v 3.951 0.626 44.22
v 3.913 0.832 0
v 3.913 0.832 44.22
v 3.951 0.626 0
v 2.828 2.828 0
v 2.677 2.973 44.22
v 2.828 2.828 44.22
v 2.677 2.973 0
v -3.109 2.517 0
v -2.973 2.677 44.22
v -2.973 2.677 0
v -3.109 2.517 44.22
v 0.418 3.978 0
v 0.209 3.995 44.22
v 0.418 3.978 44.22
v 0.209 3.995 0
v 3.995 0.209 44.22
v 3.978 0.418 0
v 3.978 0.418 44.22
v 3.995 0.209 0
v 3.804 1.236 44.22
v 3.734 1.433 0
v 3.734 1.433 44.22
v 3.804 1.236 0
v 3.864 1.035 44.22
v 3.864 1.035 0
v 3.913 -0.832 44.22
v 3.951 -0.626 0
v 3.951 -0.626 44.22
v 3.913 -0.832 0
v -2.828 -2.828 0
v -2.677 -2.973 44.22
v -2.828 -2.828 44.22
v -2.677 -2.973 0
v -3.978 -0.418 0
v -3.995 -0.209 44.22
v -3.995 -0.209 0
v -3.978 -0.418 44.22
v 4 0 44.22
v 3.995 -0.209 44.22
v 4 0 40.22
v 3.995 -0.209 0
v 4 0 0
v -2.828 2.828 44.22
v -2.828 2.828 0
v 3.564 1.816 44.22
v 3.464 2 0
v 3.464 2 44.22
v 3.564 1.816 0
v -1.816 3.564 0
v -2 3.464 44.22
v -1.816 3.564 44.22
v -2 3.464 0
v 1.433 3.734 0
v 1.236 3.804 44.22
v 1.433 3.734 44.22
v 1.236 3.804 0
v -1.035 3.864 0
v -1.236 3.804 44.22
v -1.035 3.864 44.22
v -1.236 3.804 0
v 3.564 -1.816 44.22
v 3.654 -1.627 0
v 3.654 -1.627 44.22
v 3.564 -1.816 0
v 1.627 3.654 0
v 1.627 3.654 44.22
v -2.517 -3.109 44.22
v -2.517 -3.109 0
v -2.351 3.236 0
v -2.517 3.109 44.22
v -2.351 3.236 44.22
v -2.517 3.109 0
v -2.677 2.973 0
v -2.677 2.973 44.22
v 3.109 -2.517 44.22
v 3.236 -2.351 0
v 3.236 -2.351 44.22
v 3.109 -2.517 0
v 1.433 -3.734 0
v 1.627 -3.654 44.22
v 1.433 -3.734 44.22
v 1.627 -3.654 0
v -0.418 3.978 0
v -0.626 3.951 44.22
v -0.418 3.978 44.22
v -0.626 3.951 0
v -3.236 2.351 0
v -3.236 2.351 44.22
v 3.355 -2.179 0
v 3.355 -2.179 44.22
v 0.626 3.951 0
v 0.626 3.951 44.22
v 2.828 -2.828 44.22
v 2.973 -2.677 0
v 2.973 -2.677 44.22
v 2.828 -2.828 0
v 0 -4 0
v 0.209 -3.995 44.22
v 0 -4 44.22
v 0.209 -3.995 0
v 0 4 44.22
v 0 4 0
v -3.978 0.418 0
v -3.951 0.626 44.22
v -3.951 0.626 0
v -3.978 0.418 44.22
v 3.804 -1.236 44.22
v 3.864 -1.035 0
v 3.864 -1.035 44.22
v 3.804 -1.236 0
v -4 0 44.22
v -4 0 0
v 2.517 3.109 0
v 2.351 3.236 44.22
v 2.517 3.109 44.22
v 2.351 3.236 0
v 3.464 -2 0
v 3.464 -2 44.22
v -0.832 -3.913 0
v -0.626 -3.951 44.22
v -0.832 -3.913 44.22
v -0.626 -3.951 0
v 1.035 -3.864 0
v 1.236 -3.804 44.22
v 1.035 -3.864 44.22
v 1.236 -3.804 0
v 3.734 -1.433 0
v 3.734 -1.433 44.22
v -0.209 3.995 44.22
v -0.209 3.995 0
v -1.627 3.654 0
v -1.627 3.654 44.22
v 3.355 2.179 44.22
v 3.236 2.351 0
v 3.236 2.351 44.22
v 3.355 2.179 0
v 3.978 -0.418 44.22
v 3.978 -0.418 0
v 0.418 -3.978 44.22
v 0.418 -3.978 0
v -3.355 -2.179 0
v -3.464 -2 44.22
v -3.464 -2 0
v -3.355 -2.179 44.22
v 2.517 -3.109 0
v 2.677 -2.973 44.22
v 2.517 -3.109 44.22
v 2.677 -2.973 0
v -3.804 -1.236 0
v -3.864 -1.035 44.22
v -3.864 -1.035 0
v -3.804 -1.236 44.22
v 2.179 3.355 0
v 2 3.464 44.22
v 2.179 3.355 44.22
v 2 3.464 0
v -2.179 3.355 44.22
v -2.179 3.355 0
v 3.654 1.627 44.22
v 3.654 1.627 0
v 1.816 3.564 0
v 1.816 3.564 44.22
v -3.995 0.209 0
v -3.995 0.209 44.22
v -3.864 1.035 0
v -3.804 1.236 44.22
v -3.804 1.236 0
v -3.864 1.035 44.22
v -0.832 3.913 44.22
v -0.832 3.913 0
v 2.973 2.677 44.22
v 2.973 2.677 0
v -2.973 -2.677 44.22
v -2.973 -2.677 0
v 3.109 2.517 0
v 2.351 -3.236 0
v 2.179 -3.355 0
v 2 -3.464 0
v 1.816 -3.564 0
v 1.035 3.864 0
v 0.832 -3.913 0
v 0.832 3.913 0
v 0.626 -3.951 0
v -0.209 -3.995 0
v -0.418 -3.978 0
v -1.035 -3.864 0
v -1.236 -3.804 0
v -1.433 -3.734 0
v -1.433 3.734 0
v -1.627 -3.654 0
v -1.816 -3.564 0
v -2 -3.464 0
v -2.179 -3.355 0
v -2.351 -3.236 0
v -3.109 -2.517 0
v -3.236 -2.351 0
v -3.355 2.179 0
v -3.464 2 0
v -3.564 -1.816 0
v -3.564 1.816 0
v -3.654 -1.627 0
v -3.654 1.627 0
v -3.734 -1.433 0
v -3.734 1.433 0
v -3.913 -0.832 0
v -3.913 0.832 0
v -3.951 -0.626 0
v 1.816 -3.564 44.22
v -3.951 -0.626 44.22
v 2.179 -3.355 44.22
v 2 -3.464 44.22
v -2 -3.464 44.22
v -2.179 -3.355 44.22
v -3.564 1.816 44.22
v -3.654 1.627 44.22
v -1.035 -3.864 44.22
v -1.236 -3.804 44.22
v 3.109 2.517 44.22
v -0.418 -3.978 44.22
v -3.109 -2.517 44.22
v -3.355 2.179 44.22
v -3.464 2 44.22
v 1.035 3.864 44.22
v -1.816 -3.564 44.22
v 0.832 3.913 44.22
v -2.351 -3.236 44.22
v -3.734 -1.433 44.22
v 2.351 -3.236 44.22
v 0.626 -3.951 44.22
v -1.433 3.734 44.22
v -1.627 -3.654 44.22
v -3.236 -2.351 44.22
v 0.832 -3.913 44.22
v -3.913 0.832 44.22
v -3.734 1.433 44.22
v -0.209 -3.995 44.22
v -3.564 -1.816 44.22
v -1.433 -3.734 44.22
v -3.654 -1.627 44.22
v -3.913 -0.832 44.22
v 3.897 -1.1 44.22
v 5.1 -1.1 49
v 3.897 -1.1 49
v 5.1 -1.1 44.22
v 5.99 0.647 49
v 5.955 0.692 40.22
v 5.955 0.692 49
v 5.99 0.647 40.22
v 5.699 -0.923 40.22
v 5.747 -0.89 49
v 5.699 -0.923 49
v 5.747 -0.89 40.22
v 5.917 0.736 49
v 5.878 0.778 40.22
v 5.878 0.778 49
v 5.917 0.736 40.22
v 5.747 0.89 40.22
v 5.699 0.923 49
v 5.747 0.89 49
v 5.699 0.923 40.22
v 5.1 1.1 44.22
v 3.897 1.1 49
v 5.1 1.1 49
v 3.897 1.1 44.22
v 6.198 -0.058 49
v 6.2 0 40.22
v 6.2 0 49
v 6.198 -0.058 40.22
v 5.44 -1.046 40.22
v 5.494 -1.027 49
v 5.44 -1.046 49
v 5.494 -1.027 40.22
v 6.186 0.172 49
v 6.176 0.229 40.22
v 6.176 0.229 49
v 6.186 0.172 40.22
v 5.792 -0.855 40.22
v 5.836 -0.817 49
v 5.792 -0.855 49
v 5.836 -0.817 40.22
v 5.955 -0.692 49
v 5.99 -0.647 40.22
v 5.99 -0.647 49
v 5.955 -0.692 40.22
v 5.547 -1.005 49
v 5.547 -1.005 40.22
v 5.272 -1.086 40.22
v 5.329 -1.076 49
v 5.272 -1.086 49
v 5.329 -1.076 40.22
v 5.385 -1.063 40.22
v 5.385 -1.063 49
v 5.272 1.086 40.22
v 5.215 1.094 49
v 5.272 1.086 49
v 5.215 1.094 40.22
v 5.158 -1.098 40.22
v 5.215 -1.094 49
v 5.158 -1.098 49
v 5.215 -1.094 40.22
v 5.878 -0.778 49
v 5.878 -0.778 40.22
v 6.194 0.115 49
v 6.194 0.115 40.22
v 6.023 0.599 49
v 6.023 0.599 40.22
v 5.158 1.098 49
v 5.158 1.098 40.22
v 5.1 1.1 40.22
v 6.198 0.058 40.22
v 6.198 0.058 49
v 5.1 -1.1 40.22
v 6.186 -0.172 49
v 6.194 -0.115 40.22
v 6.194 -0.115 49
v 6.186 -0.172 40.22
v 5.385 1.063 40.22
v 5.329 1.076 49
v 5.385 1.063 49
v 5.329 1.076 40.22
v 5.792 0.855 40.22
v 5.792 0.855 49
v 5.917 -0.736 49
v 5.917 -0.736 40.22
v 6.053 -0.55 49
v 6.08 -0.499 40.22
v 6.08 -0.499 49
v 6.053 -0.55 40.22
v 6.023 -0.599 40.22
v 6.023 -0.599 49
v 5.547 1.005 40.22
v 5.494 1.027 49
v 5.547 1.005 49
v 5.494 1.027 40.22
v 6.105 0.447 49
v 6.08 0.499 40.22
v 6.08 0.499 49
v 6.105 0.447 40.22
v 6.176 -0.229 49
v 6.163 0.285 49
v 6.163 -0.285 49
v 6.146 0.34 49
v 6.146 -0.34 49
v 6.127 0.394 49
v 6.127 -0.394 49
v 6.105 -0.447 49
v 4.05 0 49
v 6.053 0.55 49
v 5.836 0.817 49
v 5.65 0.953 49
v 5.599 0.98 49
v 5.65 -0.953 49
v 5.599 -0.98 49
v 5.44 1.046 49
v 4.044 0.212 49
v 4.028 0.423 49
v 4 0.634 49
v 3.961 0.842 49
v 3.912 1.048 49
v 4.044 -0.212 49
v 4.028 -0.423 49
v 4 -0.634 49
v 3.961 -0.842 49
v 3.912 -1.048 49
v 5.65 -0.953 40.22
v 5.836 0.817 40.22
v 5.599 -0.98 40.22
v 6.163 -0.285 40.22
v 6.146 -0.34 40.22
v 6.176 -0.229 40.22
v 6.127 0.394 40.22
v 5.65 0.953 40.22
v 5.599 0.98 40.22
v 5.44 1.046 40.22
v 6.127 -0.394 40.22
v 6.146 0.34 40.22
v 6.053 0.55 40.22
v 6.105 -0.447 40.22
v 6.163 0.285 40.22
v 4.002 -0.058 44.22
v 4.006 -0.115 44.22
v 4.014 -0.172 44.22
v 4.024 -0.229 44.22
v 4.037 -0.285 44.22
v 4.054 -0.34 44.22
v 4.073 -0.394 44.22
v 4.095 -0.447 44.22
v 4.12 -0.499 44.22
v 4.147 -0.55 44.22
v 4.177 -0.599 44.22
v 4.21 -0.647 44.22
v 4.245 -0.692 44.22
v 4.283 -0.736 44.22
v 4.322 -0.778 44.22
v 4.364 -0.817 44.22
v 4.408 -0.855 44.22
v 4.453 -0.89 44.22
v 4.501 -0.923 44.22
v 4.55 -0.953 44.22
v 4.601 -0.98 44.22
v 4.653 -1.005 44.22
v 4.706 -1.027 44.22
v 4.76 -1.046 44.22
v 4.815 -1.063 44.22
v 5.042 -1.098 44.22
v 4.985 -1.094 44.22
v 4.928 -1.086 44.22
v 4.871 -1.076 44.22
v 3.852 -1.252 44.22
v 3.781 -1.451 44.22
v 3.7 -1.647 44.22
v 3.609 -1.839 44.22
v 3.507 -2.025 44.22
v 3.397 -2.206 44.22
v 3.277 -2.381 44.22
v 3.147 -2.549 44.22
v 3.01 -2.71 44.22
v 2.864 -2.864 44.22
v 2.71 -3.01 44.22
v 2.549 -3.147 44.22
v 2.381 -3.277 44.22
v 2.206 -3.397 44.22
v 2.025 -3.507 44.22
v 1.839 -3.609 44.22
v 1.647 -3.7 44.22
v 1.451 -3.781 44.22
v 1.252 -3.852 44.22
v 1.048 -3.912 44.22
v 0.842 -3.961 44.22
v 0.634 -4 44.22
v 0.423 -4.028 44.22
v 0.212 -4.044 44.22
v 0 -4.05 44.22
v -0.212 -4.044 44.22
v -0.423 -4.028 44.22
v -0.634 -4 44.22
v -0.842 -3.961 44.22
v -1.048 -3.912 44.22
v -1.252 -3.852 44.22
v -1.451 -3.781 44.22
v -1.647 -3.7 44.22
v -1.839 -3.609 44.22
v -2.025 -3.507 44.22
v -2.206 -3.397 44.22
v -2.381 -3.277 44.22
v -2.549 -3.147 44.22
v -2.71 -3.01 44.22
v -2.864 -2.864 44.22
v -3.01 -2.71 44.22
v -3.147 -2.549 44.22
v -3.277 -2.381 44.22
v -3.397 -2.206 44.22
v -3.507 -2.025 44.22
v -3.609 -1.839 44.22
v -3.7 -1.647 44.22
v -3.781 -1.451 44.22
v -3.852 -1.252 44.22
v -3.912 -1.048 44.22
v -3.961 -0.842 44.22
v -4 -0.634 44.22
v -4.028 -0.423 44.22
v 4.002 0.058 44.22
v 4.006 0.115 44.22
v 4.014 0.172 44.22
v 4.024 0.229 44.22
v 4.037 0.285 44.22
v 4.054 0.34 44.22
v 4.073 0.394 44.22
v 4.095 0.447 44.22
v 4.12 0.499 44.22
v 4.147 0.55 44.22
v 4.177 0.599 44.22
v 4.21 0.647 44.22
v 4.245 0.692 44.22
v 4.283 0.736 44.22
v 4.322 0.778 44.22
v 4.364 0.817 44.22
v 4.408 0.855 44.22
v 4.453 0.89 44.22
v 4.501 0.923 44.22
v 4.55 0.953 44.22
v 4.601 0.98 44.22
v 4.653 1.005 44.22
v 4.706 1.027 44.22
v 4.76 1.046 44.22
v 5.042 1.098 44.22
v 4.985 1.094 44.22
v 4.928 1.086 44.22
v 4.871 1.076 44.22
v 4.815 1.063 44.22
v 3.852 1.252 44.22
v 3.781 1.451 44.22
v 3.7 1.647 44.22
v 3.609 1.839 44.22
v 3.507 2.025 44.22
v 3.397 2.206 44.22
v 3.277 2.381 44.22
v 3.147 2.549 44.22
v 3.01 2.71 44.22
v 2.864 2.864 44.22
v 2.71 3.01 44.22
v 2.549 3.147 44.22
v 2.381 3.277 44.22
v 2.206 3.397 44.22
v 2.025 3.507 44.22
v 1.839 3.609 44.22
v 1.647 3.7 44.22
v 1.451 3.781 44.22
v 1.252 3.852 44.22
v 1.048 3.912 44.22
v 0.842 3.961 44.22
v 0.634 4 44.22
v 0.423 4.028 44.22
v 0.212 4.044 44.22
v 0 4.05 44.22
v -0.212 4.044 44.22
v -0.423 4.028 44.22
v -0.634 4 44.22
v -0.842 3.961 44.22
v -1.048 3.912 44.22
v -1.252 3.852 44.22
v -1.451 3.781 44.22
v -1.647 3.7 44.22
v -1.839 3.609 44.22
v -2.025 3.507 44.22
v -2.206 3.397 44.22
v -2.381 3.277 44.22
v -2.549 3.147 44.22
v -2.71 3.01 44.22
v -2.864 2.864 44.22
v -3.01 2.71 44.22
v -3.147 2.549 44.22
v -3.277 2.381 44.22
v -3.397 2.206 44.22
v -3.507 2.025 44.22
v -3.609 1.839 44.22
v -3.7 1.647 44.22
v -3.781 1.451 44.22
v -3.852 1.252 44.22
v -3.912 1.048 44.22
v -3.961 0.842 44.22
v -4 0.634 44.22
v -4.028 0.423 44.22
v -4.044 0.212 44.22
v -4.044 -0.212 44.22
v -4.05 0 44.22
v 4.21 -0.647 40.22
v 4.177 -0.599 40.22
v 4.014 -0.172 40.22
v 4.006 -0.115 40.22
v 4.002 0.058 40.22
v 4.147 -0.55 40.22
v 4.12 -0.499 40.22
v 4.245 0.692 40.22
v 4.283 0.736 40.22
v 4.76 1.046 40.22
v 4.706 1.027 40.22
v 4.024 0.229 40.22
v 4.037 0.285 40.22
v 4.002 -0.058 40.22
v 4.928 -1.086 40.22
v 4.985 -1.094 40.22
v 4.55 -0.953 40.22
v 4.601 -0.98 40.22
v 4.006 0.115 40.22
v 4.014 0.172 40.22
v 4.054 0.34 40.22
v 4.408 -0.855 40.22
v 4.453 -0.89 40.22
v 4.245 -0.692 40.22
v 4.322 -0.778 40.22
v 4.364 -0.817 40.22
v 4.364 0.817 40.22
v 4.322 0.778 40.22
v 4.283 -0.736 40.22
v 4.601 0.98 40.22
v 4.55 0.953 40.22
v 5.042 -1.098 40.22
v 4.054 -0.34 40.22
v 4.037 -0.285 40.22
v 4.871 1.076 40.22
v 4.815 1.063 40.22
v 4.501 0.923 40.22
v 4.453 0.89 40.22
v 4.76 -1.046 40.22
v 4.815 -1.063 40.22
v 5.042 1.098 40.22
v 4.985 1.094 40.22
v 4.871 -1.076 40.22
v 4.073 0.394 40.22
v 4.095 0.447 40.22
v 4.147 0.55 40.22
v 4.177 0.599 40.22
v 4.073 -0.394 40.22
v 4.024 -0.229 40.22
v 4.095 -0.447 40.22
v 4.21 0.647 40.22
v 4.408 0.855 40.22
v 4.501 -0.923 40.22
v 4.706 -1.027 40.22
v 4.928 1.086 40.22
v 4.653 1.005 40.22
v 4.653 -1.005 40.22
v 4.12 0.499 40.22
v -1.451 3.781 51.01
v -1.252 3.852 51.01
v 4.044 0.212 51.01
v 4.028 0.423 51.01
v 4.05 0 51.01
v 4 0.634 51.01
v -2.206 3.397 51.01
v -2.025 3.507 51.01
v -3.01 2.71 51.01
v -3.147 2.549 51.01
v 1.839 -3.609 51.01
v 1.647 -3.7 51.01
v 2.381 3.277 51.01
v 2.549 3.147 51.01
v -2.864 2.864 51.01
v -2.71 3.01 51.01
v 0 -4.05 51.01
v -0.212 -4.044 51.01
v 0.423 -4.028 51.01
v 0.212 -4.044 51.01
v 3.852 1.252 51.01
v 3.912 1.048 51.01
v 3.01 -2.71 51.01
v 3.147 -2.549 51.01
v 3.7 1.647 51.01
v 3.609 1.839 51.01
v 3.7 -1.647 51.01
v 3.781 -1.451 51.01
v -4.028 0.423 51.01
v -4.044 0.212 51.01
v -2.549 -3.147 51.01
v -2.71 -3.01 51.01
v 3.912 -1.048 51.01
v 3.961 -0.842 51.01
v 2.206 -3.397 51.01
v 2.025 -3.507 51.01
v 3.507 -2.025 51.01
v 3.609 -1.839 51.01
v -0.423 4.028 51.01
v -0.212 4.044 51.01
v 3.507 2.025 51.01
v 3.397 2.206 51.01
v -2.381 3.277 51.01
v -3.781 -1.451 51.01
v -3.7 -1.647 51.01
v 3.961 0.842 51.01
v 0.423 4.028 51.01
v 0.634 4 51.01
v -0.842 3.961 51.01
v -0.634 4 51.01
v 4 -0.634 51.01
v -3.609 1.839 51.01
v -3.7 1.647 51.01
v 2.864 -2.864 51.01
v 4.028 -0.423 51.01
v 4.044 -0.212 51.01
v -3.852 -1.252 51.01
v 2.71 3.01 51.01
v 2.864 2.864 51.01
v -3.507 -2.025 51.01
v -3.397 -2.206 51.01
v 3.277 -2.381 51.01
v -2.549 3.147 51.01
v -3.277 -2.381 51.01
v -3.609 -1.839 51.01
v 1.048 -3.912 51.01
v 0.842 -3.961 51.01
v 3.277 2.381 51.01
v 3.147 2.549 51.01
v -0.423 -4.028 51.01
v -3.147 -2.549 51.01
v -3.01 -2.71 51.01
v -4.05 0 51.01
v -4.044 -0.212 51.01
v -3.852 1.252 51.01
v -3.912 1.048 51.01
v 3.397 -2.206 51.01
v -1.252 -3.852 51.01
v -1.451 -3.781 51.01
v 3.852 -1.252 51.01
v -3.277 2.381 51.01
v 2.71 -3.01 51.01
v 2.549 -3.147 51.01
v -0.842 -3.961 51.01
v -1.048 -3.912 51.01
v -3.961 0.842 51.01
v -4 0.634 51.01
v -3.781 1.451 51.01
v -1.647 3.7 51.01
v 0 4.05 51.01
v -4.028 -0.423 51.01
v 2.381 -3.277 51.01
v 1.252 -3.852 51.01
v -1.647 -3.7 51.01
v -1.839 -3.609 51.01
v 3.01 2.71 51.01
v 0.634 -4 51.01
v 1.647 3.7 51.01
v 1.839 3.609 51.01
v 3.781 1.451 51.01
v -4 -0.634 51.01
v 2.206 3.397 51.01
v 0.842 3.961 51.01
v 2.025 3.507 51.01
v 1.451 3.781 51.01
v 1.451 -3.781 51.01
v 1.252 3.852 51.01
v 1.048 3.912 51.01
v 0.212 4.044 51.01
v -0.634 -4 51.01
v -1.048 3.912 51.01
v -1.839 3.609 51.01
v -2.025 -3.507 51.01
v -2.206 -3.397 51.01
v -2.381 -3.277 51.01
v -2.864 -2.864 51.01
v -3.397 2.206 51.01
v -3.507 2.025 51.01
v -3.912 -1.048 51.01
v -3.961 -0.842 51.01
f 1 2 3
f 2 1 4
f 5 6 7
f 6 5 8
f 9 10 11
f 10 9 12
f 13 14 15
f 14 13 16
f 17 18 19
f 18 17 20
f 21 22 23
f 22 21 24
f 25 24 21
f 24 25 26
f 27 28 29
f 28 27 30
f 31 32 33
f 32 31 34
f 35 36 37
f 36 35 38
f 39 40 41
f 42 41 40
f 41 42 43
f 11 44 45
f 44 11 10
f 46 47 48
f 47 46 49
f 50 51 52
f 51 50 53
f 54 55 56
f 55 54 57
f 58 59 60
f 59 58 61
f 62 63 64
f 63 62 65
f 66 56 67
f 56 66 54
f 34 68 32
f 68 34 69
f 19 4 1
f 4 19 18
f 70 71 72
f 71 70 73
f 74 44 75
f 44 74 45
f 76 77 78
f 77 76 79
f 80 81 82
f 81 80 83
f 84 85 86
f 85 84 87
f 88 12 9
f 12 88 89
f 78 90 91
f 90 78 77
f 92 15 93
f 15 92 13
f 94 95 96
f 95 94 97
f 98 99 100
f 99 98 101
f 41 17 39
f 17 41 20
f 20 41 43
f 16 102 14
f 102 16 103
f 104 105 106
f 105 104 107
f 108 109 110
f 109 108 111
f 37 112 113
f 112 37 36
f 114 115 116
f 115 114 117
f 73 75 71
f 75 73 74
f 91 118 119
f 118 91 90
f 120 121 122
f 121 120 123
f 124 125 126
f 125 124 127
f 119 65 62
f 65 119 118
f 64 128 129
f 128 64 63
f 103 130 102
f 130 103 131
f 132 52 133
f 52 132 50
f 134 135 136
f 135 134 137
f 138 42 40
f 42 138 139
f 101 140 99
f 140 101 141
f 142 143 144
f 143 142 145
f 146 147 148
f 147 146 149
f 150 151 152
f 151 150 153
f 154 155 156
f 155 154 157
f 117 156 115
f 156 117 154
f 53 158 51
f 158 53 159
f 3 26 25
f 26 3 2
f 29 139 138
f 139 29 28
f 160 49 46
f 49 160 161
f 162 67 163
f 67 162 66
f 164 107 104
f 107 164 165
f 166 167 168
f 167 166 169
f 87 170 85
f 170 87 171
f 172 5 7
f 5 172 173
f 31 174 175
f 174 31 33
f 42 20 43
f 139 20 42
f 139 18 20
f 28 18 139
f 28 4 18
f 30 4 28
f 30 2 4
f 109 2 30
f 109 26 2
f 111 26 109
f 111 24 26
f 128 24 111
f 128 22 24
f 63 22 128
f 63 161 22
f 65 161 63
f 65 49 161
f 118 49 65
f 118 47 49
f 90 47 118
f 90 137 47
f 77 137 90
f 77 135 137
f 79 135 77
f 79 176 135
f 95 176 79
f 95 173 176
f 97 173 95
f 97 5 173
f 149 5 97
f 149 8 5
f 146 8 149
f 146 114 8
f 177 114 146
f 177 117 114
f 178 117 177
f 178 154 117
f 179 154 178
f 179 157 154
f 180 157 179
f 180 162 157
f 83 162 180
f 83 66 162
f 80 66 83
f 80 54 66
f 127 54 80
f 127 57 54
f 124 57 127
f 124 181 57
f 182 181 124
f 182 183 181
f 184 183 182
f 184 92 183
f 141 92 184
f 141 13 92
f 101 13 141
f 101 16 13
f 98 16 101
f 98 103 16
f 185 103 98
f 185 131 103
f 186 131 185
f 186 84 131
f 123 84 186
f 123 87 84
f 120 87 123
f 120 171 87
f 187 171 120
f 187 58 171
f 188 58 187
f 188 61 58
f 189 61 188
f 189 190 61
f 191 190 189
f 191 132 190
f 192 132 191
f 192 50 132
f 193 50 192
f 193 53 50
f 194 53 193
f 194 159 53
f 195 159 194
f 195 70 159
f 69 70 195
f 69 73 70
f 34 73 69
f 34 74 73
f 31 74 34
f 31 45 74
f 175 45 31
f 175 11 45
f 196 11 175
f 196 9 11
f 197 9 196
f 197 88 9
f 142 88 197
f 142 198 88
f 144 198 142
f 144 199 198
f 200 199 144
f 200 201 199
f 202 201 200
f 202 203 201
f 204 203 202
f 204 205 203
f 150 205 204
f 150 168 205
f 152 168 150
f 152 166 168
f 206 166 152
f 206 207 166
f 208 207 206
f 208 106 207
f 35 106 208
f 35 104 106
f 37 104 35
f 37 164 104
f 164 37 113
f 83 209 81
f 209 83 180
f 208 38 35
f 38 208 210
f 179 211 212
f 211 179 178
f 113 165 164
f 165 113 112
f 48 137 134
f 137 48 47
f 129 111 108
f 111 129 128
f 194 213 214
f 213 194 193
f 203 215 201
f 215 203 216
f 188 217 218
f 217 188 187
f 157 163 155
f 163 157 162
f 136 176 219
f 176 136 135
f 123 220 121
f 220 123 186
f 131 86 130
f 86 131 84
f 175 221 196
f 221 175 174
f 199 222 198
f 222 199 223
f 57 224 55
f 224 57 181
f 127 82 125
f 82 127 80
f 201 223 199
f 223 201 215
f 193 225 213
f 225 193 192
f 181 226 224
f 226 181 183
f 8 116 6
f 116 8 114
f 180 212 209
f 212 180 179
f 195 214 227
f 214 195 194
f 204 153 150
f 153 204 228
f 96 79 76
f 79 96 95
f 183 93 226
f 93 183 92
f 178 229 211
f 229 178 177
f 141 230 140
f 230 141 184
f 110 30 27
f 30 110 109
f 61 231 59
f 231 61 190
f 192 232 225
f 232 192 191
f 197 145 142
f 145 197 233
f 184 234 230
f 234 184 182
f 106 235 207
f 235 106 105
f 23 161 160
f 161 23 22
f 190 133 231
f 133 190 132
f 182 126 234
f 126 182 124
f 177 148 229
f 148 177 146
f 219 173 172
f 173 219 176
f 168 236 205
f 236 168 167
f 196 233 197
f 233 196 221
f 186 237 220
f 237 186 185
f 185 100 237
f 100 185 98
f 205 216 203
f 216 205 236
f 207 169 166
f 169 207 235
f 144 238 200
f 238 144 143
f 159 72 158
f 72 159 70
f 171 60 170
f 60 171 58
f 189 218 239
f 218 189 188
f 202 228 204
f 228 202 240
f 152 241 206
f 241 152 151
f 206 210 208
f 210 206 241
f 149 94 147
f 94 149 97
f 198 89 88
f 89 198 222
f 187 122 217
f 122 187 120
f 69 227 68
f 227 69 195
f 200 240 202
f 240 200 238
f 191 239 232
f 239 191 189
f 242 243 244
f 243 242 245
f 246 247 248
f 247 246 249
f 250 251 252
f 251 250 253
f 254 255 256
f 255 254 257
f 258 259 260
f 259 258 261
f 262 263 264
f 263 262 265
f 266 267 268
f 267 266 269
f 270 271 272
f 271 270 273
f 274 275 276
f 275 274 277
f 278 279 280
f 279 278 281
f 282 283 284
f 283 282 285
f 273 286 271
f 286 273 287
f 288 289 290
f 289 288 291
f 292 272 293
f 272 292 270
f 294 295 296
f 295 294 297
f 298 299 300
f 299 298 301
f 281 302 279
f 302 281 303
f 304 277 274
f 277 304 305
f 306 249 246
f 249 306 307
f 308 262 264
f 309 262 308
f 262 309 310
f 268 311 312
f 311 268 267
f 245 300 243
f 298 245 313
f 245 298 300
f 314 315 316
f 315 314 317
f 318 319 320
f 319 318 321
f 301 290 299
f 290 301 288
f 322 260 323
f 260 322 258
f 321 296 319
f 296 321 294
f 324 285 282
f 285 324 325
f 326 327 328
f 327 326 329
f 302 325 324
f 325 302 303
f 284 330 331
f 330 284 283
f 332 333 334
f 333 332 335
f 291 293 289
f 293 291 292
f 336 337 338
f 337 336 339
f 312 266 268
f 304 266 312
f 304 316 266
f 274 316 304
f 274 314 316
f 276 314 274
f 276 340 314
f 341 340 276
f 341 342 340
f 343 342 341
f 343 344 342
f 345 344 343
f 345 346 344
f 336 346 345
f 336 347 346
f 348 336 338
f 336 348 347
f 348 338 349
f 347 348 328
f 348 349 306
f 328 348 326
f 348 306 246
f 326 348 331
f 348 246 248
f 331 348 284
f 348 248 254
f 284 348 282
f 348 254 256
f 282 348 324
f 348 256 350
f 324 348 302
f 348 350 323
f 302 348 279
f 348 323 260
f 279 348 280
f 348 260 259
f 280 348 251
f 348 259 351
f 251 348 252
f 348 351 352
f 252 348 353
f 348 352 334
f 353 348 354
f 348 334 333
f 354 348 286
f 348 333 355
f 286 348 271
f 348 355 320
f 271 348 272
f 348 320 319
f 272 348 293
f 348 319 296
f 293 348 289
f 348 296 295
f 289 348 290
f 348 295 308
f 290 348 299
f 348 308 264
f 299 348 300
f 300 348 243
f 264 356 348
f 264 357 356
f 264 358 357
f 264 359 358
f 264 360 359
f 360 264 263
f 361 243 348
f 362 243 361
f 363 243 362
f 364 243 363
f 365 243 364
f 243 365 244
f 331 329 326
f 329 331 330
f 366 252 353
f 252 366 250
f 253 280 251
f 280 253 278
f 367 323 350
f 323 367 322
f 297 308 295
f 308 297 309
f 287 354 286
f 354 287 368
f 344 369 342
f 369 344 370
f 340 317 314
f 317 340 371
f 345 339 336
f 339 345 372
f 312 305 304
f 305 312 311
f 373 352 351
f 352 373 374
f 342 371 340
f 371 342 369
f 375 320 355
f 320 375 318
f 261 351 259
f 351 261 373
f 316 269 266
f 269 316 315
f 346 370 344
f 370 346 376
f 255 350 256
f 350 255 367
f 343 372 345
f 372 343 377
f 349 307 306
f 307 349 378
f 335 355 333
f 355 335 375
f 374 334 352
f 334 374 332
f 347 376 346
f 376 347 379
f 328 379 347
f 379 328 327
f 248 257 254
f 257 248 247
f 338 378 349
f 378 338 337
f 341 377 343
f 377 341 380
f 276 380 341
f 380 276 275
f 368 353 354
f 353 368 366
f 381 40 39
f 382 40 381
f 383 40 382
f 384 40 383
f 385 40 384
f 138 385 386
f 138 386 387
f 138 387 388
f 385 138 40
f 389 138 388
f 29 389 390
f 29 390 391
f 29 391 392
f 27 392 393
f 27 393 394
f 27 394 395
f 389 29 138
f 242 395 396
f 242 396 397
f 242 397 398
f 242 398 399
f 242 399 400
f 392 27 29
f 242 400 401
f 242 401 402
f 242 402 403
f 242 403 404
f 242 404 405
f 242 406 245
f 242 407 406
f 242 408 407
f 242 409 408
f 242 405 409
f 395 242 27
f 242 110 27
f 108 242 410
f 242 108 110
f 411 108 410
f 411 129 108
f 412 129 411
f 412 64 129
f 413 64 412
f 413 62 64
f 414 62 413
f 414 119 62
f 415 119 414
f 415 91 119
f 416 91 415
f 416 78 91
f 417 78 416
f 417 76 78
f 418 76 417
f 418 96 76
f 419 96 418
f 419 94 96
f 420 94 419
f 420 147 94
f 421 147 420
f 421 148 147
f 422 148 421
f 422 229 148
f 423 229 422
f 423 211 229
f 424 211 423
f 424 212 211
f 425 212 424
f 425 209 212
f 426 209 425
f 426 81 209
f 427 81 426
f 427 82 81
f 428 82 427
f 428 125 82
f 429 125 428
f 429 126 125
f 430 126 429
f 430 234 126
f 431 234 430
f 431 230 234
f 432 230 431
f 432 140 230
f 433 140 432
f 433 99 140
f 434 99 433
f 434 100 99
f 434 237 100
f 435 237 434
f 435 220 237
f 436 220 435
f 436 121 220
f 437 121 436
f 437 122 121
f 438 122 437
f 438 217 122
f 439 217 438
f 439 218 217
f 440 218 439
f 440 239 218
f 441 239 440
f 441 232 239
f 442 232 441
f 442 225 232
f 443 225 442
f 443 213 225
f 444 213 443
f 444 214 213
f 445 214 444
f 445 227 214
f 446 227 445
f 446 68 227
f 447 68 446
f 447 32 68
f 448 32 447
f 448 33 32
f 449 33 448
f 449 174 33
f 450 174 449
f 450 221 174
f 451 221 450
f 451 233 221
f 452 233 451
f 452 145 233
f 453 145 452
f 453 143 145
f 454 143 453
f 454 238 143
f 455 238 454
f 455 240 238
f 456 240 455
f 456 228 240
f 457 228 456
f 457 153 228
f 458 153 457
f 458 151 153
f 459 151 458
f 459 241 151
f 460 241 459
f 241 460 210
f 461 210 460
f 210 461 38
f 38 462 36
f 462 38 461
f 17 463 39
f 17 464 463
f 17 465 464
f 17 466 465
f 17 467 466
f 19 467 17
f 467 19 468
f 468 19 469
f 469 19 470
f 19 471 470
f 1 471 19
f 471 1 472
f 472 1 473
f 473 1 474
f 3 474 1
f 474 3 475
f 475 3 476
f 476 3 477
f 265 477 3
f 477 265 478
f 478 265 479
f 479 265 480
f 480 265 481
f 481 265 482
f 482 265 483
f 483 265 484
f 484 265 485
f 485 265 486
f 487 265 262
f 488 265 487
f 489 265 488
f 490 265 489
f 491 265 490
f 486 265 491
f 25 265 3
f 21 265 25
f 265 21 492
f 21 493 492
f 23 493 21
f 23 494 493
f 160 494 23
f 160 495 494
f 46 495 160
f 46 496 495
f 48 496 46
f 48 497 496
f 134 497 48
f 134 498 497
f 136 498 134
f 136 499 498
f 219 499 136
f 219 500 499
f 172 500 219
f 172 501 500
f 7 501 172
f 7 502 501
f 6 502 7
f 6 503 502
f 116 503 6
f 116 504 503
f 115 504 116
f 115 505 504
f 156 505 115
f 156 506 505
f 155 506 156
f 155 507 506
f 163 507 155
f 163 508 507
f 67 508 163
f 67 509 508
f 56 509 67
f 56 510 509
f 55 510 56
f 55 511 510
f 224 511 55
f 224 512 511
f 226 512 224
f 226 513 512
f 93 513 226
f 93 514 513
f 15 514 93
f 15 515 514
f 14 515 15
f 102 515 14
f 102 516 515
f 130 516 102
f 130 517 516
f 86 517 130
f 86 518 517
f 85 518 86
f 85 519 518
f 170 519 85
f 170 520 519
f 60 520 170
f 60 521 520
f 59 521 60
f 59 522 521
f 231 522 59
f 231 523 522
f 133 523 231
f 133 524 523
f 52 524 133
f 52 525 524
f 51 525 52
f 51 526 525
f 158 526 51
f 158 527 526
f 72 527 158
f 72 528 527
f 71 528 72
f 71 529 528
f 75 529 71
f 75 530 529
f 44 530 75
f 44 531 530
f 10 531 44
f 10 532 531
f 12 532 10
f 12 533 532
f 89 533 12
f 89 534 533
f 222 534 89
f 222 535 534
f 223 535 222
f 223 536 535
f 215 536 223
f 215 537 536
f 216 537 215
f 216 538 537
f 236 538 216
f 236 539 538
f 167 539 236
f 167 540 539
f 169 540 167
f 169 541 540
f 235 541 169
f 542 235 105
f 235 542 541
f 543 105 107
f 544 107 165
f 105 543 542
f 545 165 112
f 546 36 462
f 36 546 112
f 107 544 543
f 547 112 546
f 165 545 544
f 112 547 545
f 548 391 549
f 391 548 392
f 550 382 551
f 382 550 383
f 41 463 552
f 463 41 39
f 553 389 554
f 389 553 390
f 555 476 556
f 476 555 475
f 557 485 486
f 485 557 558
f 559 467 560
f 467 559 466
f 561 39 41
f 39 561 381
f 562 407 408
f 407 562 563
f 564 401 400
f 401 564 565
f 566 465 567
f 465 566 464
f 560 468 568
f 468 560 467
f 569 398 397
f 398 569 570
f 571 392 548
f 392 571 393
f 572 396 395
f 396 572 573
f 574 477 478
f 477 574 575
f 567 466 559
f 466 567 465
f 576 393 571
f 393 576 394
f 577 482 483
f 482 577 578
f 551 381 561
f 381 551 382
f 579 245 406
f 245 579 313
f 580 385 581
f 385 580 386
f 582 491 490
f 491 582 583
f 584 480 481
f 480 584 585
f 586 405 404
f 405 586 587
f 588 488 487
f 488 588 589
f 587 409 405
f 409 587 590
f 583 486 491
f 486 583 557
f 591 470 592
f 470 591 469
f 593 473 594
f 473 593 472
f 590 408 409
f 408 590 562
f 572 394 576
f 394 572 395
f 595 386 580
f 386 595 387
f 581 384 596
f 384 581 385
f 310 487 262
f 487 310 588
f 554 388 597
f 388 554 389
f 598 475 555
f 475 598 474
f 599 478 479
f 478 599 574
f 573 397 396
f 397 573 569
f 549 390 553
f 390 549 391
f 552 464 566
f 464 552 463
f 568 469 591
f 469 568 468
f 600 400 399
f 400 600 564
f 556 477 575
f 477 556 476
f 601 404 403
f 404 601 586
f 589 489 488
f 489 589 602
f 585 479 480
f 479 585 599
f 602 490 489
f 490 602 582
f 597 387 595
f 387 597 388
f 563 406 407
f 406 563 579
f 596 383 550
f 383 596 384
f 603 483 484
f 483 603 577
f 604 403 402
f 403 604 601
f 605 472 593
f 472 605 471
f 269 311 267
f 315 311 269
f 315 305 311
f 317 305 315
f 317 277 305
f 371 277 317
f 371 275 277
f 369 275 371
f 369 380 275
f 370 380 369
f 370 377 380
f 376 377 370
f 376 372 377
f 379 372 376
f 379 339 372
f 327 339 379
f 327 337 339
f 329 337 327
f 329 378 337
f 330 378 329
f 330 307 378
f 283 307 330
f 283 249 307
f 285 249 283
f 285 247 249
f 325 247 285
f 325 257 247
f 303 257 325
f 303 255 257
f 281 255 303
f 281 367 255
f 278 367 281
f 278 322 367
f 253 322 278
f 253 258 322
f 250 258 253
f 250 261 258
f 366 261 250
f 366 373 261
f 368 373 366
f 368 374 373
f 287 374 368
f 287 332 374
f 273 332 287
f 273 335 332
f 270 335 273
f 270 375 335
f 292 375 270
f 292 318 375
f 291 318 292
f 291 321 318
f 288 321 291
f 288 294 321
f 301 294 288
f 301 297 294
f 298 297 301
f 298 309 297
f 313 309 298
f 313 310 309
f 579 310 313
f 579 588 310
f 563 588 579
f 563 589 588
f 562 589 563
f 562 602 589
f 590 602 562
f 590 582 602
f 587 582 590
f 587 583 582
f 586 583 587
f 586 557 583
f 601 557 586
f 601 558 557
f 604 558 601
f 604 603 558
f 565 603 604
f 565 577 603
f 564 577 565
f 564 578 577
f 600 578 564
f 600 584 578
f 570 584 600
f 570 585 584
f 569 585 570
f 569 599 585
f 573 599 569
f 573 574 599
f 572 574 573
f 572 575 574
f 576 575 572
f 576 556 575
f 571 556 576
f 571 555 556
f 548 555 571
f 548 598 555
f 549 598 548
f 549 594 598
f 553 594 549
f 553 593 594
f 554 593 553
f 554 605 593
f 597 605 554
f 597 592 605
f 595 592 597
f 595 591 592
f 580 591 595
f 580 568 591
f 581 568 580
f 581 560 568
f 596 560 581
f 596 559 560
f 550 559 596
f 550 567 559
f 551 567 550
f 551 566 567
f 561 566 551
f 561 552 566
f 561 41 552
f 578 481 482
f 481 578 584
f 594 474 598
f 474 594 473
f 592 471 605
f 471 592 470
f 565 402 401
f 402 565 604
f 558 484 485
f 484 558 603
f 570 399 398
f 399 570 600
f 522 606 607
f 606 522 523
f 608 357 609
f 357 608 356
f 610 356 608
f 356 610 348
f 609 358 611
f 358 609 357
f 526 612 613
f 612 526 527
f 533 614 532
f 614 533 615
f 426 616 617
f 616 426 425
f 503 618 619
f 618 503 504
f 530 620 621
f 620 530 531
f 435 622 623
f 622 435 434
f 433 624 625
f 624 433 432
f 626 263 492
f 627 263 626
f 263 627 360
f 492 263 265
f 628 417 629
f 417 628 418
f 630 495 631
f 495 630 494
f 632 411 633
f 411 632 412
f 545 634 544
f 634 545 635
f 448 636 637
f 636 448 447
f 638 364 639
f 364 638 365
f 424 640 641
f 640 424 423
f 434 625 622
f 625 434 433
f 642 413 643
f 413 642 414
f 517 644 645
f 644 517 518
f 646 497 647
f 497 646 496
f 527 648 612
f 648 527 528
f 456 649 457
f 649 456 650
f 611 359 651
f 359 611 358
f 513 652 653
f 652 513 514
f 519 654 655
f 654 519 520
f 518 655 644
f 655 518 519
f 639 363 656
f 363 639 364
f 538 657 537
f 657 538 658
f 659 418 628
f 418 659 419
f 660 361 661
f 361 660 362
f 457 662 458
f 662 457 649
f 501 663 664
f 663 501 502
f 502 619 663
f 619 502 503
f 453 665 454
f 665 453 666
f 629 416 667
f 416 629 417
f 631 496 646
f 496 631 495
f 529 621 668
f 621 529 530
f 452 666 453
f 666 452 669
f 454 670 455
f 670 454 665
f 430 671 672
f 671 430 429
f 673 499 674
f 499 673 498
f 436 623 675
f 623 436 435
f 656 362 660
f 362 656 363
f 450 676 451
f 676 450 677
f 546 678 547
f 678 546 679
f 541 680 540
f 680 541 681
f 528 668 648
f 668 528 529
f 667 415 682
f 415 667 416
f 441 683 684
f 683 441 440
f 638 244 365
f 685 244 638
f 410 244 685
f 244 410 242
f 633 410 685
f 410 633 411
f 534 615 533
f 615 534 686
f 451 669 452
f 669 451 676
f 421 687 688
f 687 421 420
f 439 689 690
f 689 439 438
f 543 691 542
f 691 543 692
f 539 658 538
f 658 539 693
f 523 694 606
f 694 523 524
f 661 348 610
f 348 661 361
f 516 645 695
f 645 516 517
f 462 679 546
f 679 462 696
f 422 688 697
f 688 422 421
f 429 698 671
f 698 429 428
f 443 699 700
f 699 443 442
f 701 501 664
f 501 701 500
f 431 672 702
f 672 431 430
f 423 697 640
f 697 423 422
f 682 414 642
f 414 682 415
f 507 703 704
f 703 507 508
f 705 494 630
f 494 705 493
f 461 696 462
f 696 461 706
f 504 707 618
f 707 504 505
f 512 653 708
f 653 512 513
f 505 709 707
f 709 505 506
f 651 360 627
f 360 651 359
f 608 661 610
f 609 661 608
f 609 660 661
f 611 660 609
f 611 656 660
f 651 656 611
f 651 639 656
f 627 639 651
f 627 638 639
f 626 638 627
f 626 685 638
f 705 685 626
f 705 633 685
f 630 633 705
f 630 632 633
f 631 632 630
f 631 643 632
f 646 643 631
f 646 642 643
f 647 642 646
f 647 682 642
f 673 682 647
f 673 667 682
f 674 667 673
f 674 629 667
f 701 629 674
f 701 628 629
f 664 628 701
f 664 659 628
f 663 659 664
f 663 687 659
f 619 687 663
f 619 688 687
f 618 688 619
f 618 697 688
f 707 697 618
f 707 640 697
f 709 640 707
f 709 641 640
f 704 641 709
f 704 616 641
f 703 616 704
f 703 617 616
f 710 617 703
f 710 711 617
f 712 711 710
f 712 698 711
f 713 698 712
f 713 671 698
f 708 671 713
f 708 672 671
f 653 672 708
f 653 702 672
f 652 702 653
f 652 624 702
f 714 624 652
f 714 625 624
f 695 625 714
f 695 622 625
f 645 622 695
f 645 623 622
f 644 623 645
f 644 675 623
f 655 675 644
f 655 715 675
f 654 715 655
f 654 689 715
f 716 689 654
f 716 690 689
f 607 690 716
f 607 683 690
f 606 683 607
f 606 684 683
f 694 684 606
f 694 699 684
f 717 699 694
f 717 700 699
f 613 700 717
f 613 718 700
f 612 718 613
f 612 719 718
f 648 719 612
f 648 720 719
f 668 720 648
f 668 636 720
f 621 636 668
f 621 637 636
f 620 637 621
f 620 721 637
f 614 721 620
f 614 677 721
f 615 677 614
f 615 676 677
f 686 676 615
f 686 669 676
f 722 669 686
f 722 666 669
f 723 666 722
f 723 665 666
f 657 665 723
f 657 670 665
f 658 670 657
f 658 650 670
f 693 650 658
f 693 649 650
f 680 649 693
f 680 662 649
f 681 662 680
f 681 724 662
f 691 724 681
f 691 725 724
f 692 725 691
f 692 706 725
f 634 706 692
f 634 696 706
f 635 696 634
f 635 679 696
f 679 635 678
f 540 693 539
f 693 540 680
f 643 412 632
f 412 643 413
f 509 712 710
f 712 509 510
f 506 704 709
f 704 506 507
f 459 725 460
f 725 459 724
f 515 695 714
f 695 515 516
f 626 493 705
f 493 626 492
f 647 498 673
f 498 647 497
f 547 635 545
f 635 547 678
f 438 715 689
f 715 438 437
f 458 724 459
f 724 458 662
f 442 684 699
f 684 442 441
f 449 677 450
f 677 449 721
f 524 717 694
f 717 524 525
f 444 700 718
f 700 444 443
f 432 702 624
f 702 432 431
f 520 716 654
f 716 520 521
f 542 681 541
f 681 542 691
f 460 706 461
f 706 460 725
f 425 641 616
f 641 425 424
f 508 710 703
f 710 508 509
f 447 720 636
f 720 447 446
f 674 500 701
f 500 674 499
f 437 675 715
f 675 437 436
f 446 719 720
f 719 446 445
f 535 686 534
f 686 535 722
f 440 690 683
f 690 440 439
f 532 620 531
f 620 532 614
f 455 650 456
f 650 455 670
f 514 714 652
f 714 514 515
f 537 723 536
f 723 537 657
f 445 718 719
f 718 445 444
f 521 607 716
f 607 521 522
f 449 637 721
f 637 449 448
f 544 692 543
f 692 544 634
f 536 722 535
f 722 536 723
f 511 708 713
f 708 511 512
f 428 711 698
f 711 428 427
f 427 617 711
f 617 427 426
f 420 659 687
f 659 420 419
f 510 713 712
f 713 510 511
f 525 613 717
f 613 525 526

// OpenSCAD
$fn=120;
s = 0.01;

module sample() {
    color("grey") cylinder(d=8, h=51);
    color("black") hull() {
        translate([0,0,51-2-8.78+4]) cylinder(d=2.2,h=8.78-4);
        translate([4+2.2/2,0,51-2-8.78+4]) cylinder(d=2.2,h=8.78-4);
    }
    color("black") translate([4+2.2/2,0,51-2-8.78]) cylinder(d=2.2,h=8.78);
    color("black") translate([0,0,51-2-8.78+4]) cylinder(d=8.1,h=8.78-4+2+s);
}

sample();
